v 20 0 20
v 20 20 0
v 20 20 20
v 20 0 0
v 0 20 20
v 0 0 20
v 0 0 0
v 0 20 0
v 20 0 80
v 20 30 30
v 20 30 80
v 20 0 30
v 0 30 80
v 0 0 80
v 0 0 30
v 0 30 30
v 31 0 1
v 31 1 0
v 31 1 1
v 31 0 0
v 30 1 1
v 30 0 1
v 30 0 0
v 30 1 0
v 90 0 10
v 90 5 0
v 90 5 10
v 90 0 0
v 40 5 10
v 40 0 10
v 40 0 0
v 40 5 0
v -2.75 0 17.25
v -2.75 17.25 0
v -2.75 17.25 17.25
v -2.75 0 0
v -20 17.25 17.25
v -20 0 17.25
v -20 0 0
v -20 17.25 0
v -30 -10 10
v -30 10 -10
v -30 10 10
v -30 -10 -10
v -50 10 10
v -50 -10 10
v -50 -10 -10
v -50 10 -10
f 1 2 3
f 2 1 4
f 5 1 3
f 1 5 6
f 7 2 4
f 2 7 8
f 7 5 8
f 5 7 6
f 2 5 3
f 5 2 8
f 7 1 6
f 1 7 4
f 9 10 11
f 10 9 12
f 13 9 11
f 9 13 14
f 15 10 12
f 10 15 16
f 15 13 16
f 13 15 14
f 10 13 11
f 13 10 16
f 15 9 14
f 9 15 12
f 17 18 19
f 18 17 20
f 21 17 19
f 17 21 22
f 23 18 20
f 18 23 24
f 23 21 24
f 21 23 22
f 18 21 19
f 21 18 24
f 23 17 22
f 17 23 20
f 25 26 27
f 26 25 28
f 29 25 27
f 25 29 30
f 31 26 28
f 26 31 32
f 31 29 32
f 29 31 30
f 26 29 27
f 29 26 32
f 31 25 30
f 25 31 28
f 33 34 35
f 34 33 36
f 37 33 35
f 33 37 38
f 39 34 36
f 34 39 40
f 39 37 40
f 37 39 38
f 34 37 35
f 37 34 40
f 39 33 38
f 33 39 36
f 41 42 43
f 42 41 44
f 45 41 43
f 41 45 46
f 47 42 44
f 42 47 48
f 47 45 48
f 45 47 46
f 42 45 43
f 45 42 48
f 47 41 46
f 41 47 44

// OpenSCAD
cube(size = 20);

translate([0, 0, 30])
    cube([20, 30, 50]);

translate([30, 0, 0])
    cube();

translate([40, 0, 0])
    cube([50, 5, 10]);
    
translate([-20, 0, 0])
    cube(size = 17.25);

translate([-40, 0, 0])
    cube(size = 20, center = true);
